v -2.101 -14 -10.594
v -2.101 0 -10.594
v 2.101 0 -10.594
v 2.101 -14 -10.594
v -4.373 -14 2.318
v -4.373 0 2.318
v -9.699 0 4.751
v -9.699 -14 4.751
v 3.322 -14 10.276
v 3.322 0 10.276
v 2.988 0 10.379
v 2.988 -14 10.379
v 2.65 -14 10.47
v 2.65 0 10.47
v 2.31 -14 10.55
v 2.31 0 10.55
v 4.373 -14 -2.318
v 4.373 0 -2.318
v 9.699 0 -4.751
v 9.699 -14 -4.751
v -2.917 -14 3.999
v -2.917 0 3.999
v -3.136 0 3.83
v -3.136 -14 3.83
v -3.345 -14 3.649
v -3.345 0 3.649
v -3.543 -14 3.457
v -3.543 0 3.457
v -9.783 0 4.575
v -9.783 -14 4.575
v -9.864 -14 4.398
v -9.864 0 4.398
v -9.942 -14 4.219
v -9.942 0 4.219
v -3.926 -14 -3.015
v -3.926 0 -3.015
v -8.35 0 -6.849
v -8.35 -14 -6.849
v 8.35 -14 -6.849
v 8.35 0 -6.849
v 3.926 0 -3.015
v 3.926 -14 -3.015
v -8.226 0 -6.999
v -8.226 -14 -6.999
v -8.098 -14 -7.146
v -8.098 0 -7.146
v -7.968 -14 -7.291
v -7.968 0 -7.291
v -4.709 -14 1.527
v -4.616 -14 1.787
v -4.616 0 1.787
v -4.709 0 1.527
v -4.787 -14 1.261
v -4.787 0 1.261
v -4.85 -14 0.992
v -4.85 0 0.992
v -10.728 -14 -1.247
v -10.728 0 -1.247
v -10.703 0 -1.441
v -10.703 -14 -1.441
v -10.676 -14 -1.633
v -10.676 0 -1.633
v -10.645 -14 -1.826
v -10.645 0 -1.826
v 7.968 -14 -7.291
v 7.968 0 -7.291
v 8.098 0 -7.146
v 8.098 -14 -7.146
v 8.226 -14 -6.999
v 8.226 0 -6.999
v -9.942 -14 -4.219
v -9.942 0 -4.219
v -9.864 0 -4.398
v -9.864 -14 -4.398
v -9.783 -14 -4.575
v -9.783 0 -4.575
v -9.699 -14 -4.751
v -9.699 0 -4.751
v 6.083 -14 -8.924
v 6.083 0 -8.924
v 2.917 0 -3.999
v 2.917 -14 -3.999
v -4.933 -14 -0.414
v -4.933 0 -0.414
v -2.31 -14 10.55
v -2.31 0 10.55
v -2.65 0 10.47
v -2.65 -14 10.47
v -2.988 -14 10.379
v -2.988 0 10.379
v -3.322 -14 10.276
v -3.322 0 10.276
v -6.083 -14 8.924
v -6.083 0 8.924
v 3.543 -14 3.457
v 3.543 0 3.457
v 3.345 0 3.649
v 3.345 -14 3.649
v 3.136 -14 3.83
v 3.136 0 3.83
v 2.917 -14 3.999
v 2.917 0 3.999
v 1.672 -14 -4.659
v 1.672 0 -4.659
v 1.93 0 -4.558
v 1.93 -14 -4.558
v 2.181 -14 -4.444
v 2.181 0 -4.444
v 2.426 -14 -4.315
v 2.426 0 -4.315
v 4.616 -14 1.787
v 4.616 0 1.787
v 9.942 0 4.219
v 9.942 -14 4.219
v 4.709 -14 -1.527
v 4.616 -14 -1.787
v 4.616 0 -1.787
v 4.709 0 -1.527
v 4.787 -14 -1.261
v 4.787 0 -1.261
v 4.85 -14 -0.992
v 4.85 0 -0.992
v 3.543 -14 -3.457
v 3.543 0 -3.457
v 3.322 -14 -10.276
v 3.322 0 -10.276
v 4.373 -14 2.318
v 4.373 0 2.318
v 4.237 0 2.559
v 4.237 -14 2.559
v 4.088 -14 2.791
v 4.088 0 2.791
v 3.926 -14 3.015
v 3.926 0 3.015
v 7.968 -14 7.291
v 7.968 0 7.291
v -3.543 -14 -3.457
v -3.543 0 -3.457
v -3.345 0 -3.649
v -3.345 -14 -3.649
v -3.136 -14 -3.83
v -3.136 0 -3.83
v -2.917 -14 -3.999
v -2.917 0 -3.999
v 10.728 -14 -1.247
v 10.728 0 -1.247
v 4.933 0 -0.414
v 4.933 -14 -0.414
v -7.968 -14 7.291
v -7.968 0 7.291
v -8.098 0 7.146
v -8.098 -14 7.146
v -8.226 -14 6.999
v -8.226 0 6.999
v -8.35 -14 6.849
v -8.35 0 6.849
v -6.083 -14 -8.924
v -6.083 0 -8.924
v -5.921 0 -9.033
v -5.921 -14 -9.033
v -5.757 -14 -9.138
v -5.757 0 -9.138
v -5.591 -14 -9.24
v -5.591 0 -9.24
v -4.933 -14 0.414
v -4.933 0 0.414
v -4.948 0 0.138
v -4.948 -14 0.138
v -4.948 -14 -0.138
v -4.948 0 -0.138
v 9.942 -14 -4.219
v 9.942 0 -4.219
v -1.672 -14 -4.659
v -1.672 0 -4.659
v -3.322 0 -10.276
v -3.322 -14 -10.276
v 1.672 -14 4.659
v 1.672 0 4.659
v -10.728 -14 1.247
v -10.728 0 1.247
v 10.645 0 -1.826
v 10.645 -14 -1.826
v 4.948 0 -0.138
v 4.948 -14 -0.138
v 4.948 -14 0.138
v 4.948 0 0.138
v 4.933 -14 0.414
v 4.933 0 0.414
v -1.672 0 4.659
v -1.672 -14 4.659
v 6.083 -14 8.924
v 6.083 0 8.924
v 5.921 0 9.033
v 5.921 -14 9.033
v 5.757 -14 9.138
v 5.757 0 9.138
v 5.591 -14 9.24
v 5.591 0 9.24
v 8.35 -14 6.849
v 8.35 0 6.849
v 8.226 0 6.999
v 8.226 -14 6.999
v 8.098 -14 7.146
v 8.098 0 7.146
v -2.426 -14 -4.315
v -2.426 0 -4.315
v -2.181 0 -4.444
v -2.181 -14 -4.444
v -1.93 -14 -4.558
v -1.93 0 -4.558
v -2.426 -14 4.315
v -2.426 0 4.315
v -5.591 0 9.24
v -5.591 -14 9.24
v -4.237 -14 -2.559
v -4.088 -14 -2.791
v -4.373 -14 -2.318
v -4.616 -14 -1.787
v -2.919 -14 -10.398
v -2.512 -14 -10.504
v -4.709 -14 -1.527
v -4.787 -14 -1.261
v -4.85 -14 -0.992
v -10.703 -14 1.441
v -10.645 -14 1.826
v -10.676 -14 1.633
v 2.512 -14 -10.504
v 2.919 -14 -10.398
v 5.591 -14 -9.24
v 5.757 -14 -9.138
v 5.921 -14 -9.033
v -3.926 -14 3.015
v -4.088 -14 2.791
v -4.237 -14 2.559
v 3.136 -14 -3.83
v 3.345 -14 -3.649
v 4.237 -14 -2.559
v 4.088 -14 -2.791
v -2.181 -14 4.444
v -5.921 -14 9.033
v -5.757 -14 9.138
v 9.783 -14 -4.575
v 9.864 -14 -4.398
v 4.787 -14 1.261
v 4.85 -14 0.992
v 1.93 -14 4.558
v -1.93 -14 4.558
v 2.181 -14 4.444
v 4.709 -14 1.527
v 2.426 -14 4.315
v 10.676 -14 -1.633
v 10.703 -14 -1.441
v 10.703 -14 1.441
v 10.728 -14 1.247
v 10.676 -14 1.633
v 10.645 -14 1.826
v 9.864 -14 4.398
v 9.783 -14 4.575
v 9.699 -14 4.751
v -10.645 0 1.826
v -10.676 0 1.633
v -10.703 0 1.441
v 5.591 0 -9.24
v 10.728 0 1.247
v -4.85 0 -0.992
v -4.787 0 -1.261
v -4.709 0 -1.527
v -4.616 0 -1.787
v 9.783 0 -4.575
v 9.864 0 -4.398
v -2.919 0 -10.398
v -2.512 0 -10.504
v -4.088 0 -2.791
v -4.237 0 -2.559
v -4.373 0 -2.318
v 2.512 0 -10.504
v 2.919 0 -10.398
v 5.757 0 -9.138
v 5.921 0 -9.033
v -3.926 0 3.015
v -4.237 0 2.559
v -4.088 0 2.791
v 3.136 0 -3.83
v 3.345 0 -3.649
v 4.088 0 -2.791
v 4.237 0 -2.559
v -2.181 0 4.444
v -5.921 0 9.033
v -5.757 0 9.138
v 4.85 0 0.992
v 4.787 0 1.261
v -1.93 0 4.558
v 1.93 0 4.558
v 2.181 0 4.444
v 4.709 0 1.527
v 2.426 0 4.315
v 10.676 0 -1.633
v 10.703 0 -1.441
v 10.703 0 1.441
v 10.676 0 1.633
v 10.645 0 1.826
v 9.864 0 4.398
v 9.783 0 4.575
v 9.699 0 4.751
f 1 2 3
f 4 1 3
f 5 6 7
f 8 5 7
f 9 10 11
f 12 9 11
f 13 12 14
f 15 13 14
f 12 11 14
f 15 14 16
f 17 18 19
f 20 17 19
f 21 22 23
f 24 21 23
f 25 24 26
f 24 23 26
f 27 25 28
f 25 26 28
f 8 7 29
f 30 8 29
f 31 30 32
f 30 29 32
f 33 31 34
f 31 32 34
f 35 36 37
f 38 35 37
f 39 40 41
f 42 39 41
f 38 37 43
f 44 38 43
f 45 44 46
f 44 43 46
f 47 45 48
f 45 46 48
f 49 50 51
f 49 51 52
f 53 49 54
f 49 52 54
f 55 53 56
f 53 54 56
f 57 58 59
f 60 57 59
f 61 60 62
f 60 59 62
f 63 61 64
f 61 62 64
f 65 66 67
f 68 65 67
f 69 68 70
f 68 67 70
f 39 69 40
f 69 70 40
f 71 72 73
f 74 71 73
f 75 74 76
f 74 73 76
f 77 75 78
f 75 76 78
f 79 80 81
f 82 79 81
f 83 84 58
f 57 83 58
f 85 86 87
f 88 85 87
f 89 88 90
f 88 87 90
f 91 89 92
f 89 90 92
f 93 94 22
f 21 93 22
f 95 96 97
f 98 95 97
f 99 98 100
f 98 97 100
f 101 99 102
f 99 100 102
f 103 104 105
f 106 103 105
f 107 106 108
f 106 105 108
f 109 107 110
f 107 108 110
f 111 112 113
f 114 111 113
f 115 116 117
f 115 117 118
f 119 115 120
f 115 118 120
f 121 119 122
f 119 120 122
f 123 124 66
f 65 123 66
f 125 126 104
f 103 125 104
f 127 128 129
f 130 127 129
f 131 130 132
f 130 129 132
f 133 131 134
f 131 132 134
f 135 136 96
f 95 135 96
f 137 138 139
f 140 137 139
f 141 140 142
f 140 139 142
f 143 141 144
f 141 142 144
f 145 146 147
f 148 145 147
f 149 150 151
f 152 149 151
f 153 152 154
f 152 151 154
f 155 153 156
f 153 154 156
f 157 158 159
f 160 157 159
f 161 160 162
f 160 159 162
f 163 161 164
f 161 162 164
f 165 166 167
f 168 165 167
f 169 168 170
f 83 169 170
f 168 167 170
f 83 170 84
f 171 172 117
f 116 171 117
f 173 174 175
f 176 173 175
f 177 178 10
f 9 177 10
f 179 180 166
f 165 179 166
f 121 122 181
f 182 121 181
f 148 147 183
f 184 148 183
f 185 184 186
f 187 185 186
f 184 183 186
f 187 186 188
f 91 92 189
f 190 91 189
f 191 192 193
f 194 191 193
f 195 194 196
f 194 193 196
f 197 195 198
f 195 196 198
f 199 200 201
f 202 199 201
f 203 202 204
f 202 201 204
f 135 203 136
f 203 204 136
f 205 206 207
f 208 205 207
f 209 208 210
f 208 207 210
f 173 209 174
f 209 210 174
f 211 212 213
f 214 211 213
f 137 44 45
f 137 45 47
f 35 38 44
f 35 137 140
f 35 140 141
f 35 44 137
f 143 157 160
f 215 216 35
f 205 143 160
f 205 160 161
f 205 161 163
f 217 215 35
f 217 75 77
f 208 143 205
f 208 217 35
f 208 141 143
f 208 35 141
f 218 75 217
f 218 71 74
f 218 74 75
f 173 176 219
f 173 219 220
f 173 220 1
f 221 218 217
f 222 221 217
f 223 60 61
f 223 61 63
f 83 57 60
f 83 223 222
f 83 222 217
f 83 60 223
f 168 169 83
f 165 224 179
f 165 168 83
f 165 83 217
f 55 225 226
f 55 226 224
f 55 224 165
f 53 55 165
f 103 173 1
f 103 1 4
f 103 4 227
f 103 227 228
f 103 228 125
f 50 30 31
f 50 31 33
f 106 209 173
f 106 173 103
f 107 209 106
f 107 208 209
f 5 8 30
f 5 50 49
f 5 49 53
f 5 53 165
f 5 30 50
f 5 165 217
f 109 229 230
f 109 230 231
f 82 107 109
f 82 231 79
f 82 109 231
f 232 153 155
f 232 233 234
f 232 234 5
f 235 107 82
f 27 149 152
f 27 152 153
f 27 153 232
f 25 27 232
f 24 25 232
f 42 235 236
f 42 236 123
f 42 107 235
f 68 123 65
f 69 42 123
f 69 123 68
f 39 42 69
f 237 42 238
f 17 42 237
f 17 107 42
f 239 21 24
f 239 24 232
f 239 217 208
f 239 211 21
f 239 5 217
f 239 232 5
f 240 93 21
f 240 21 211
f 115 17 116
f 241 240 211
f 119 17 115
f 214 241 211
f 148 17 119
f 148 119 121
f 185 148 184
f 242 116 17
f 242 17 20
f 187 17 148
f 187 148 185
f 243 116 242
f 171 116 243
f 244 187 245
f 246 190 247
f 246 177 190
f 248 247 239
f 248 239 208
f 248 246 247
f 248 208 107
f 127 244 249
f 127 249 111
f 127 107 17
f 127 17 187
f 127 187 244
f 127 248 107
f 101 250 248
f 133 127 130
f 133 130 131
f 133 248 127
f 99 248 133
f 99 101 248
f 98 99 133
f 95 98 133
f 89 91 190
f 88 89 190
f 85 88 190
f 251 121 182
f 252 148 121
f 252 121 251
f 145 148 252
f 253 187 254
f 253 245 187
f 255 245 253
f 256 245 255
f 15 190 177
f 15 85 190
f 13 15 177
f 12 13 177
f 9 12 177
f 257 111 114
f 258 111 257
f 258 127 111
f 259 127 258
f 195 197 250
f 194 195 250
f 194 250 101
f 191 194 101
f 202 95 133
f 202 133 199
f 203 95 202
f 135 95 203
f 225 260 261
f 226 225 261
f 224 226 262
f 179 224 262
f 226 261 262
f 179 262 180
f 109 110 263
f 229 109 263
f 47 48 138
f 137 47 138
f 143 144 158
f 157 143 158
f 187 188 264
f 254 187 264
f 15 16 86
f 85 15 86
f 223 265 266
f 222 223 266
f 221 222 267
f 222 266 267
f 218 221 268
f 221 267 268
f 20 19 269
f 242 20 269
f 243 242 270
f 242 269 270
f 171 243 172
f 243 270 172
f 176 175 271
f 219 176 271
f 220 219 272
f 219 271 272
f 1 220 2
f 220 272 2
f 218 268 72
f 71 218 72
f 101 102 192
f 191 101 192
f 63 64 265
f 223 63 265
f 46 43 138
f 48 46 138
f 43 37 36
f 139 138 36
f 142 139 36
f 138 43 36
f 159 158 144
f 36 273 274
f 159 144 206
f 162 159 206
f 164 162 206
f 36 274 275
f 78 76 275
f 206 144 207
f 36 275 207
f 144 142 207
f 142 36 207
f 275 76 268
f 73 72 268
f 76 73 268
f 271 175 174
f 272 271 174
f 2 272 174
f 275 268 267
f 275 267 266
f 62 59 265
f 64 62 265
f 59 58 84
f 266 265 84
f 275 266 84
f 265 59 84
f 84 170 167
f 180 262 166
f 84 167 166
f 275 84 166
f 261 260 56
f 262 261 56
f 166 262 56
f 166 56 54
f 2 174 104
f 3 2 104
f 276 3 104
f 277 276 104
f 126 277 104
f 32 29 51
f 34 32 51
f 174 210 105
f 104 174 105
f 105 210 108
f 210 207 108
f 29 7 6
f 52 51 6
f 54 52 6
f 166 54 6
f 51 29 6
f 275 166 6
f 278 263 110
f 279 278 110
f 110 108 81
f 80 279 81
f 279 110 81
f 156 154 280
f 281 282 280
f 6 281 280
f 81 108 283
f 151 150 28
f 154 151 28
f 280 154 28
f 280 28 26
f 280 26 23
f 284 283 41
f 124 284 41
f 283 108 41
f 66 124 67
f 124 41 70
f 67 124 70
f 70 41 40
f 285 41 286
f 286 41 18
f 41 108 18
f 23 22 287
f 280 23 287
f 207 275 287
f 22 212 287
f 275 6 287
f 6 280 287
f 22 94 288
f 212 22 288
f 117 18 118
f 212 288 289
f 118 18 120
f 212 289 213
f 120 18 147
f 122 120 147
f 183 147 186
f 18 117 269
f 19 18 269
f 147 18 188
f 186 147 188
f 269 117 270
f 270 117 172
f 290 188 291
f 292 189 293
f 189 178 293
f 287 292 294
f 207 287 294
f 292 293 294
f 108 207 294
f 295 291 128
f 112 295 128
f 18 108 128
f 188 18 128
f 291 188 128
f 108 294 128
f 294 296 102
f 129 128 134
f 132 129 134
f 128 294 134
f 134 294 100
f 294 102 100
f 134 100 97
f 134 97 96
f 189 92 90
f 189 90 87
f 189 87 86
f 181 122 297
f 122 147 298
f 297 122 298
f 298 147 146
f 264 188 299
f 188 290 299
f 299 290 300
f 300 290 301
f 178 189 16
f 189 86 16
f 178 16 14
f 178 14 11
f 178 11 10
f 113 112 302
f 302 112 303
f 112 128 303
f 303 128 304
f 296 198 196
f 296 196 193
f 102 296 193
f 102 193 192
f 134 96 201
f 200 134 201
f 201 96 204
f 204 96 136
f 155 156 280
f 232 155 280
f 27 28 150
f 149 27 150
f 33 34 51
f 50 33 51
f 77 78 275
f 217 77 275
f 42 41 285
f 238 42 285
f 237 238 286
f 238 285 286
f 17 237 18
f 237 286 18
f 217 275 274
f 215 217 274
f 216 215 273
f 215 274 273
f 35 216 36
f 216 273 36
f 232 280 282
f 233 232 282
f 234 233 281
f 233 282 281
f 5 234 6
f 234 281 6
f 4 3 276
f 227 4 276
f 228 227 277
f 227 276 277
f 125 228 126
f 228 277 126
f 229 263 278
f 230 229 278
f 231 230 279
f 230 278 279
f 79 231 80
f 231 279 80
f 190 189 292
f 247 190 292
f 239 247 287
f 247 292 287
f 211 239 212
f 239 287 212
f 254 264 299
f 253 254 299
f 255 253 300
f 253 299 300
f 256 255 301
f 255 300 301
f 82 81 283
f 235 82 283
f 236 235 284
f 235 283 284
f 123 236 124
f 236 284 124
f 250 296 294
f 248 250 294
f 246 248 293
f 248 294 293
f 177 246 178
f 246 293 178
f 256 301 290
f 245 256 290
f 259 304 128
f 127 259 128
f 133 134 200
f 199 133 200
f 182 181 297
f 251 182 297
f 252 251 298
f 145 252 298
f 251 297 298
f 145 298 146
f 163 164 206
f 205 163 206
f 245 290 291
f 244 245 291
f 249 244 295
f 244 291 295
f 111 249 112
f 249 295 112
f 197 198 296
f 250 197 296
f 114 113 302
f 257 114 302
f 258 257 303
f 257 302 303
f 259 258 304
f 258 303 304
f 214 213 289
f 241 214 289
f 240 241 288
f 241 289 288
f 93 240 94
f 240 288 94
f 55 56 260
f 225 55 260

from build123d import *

# Parameters (mm, degrees)
F1_DEPTH = 14


with BuildPart() as f1:
    # F0 (on Front) → F1 (new body)
    with BuildSketch(Plane.XZ):
        with BuildLine():
            Line((-2.425778, 4.31487), (-5.591055, 9.240136))
            ThreePointArc((-5.591055, 9.240136), (-5.838921, 9.085538), (-6.082515, 8.924293))
            Line((-6.082515, 8.924293), (-2.917239, 3.999027))
            ThreePointArc((-2.917239, 3.999027), (-3.241561, 3.74096), (-3.543157, 3.456666))
            Line((-3.543157, 3.456666), (-7.967825, 7.290663))
            ThreePointArc((-7.967825, 7.290663), (-8.162095, 7.072496), (-8.350394, 6.849154))
            Line((-8.350394, 6.849154), (-3.925726, 3.015157))
            ThreePointArc((-3.925726, 3.015157), (-4.164205, 2.676172), (-4.373489, 2.318424))
            Line((-4.373489, 2.318424), (-9.699089, 4.750544))
            ThreePointArc((-9.699089, 4.750544), (-9.824026, 4.486482), (-9.941774, 4.219137))
            Line((-9.941774, 4.219137), (-4.616175, 1.787017))
            ThreePointArc((-4.616175, 1.787017), (-4.74949, 1.394576), (-4.849508, 0.992358))
            Line((-4.849508, 0.992358), (-10.644591, 1.825565))
            ThreePointArc((-10.644591, 1.825565), (-10.690072, 1.537), (-10.727731, 1.247311))
            Line((-10.727731, 1.247311), (-4.932648, 0.414104))
            ThreePointArc((-4.932648, 0.414104), (-4.95, 0), (-4.932648, -0.414104))
            Line((-4.932648, -0.414104), (-10.727731, -1.247311))
            ThreePointArc((-10.727731, -1.247311), (-10.690072, -1.537), (-10.644591, -1.825565))
            Line((-10.644591, -1.825565), (-4.849508, -0.992358))
            ThreePointArc((-4.849508, -0.992358), (-4.74949, -1.394576), (-4.616175, -1.787017))
            Line((-4.616175, -1.787017), (-9.941774, -4.219137))
            ThreePointArc((-9.941774, -4.219137), (-9.824026, -4.486482), (-9.699089, -4.750544))
            Line((-9.699089, -4.750544), (-4.373489, -2.318424))
            ThreePointArc((-4.373489, -2.318424), (-4.164205, -2.676172), (-3.925726, -3.015157))
            Line((-3.925726, -3.015157), (-8.350394, -6.849154))
            ThreePointArc((-8.350394, -6.849154), (-8.162095, -7.072496), (-7.967825, -7.290663))
            Line((-7.967825, -7.290663), (-3.543157, -3.456666))
            ThreePointArc((-3.543157, -3.456666), (-3.241561, -3.74096), (-2.917239, -3.999027))
            Line((-2.917239, -3.999027), (-6.082515, -8.924293))
            ThreePointArc((-6.082515, -8.924293), (-5.838921, -9.085538), (-5.591055, -9.240136))
            Line((-5.591055, -9.240136), (-2.425778, -4.31487))
            ThreePointArc((-2.425778, -4.31487), (-2.056304, -4.502678), (-1.672414, -4.65892))
            Line((-1.672414, -4.65892), (-3.321866, -10.276439))
            ThreePointArc((-3.321866, -10.276439), (-2.71605, -10.452898), (-2.100962, -10.593675))
            Line((-2.100962, -10.593675), (2.100962, -10.593675))
            ThreePointArc((2.100962, -10.593675), (2.71605, -10.452898), (3.321866, -10.276439))
            Line((3.321866, -10.276439), (1.672414, -4.65892))
            ThreePointArc((1.672414, -4.65892), (2.056304, -4.502678), (2.425778, -4.31487))
            Line((2.425778, -4.31487), (5.591055, -9.240136))
            ThreePointArc((5.591055, -9.240136), (5.838921, -9.085538), (6.082515, -8.924293))
            Line((6.082515, -8.924293), (2.917239, -3.999027))
            ThreePointArc((2.917239, -3.999027), (3.241561, -3.74096), (3.543157, -3.456666))
            Line((3.543157, -3.456666), (7.967825, -7.290663))
            ThreePointArc((7.967825, -7.290663), (8.162095, -7.072496), (8.350394, -6.849154))
            Line((8.350394, -6.849154), (3.925726, -3.015157))
            ThreePointArc((3.925726, -3.015157), (4.164205, -2.676172), (4.373489, -2.318424))
            Line((4.373489, -2.318424), (9.699089, -4.750544))
            ThreePointArc((9.699089, -4.750544), (9.824026, -4.486482), (9.941774, -4.219137))
            Line((9.941774, -4.219137), (4.616175, -1.787017))
            ThreePointArc((4.616175, -1.787017), (4.74949, -1.394576), (4.849508, -0.992358))
            Line((4.849508, -0.992358), (10.644591, -1.825565))
            ThreePointArc((10.644591, -1.825565), (10.690072, -1.537), (10.727731, -1.247311))
            Line((10.727731, -1.247311), (4.932648, -0.414104))
            ThreePointArc((4.932648, -0.414104), (4.95, 0), (4.932648, 0.414104))
            Line((4.932648, 0.414104), (10.727731, 1.247311))
            ThreePointArc((10.727731, 1.247311), (10.690072, 1.537), (10.644591, 1.825565))
            Line((10.644591, 1.825565), (4.849508, 0.992358))
            ThreePointArc((4.849508, 0.992358), (4.74949, 1.394576), (4.616175, 1.787017))
            Line((4.616175, 1.787017), (9.941774, 4.219137))
            ThreePointArc((9.941774, 4.219137), (9.824026, 4.486482), (9.699089, 4.750544))
            Line((9.699089, 4.750544), (4.373489, 2.318424))
            ThreePointArc((4.373489, 2.318424), (4.164205, 2.676172), (3.925726, 3.015157))
            Line((3.925726, 3.015157), (8.350394, 6.849154))
            ThreePointArc((8.350394, 6.849154), (8.162095, 7.072496), (7.967825, 7.290663))
            Line((7.967825, 7.290663), (3.543157, 3.456666))
            ThreePointArc((3.543157, 3.456666), (3.241561, 3.74096), (2.917239, 3.999027))
            Line((2.917239, 3.999027), (6.082515, 8.924293))
            ThreePointArc((6.082515, 8.924293), (5.838921, 9.085538), (5.591055, 9.240136))
            Line((5.591055, 9.240136), (2.425778, 4.31487))
            ThreePointArc((2.425778, 4.31487), (2.056304, 4.502678), (1.672414, 4.65892))
            Line((1.672414, 4.65892), (3.321866, 10.276439))
            ThreePointArc((3.321866, 10.276439), (2.819405, 10.425496), (2.310303, 10.55))
            Line((2.310303, 10.55), (0, 10.55))
            Line((0, 10.55), (-2.310303, 10.55))
            ThreePointArc((-2.310303, 10.55), (-2.819405, 10.425496), (-3.321866, 10.276439))
            Line((-3.321866, 10.276439), (-1.672414, 4.65892))
            ThreePointArc((-1.672414, 4.65892), (-2.056304, 4.502678), (-2.425778, 4.31487))
        make_face()
    extrude(amount=F1_DEPTH)


solid = f1.part
